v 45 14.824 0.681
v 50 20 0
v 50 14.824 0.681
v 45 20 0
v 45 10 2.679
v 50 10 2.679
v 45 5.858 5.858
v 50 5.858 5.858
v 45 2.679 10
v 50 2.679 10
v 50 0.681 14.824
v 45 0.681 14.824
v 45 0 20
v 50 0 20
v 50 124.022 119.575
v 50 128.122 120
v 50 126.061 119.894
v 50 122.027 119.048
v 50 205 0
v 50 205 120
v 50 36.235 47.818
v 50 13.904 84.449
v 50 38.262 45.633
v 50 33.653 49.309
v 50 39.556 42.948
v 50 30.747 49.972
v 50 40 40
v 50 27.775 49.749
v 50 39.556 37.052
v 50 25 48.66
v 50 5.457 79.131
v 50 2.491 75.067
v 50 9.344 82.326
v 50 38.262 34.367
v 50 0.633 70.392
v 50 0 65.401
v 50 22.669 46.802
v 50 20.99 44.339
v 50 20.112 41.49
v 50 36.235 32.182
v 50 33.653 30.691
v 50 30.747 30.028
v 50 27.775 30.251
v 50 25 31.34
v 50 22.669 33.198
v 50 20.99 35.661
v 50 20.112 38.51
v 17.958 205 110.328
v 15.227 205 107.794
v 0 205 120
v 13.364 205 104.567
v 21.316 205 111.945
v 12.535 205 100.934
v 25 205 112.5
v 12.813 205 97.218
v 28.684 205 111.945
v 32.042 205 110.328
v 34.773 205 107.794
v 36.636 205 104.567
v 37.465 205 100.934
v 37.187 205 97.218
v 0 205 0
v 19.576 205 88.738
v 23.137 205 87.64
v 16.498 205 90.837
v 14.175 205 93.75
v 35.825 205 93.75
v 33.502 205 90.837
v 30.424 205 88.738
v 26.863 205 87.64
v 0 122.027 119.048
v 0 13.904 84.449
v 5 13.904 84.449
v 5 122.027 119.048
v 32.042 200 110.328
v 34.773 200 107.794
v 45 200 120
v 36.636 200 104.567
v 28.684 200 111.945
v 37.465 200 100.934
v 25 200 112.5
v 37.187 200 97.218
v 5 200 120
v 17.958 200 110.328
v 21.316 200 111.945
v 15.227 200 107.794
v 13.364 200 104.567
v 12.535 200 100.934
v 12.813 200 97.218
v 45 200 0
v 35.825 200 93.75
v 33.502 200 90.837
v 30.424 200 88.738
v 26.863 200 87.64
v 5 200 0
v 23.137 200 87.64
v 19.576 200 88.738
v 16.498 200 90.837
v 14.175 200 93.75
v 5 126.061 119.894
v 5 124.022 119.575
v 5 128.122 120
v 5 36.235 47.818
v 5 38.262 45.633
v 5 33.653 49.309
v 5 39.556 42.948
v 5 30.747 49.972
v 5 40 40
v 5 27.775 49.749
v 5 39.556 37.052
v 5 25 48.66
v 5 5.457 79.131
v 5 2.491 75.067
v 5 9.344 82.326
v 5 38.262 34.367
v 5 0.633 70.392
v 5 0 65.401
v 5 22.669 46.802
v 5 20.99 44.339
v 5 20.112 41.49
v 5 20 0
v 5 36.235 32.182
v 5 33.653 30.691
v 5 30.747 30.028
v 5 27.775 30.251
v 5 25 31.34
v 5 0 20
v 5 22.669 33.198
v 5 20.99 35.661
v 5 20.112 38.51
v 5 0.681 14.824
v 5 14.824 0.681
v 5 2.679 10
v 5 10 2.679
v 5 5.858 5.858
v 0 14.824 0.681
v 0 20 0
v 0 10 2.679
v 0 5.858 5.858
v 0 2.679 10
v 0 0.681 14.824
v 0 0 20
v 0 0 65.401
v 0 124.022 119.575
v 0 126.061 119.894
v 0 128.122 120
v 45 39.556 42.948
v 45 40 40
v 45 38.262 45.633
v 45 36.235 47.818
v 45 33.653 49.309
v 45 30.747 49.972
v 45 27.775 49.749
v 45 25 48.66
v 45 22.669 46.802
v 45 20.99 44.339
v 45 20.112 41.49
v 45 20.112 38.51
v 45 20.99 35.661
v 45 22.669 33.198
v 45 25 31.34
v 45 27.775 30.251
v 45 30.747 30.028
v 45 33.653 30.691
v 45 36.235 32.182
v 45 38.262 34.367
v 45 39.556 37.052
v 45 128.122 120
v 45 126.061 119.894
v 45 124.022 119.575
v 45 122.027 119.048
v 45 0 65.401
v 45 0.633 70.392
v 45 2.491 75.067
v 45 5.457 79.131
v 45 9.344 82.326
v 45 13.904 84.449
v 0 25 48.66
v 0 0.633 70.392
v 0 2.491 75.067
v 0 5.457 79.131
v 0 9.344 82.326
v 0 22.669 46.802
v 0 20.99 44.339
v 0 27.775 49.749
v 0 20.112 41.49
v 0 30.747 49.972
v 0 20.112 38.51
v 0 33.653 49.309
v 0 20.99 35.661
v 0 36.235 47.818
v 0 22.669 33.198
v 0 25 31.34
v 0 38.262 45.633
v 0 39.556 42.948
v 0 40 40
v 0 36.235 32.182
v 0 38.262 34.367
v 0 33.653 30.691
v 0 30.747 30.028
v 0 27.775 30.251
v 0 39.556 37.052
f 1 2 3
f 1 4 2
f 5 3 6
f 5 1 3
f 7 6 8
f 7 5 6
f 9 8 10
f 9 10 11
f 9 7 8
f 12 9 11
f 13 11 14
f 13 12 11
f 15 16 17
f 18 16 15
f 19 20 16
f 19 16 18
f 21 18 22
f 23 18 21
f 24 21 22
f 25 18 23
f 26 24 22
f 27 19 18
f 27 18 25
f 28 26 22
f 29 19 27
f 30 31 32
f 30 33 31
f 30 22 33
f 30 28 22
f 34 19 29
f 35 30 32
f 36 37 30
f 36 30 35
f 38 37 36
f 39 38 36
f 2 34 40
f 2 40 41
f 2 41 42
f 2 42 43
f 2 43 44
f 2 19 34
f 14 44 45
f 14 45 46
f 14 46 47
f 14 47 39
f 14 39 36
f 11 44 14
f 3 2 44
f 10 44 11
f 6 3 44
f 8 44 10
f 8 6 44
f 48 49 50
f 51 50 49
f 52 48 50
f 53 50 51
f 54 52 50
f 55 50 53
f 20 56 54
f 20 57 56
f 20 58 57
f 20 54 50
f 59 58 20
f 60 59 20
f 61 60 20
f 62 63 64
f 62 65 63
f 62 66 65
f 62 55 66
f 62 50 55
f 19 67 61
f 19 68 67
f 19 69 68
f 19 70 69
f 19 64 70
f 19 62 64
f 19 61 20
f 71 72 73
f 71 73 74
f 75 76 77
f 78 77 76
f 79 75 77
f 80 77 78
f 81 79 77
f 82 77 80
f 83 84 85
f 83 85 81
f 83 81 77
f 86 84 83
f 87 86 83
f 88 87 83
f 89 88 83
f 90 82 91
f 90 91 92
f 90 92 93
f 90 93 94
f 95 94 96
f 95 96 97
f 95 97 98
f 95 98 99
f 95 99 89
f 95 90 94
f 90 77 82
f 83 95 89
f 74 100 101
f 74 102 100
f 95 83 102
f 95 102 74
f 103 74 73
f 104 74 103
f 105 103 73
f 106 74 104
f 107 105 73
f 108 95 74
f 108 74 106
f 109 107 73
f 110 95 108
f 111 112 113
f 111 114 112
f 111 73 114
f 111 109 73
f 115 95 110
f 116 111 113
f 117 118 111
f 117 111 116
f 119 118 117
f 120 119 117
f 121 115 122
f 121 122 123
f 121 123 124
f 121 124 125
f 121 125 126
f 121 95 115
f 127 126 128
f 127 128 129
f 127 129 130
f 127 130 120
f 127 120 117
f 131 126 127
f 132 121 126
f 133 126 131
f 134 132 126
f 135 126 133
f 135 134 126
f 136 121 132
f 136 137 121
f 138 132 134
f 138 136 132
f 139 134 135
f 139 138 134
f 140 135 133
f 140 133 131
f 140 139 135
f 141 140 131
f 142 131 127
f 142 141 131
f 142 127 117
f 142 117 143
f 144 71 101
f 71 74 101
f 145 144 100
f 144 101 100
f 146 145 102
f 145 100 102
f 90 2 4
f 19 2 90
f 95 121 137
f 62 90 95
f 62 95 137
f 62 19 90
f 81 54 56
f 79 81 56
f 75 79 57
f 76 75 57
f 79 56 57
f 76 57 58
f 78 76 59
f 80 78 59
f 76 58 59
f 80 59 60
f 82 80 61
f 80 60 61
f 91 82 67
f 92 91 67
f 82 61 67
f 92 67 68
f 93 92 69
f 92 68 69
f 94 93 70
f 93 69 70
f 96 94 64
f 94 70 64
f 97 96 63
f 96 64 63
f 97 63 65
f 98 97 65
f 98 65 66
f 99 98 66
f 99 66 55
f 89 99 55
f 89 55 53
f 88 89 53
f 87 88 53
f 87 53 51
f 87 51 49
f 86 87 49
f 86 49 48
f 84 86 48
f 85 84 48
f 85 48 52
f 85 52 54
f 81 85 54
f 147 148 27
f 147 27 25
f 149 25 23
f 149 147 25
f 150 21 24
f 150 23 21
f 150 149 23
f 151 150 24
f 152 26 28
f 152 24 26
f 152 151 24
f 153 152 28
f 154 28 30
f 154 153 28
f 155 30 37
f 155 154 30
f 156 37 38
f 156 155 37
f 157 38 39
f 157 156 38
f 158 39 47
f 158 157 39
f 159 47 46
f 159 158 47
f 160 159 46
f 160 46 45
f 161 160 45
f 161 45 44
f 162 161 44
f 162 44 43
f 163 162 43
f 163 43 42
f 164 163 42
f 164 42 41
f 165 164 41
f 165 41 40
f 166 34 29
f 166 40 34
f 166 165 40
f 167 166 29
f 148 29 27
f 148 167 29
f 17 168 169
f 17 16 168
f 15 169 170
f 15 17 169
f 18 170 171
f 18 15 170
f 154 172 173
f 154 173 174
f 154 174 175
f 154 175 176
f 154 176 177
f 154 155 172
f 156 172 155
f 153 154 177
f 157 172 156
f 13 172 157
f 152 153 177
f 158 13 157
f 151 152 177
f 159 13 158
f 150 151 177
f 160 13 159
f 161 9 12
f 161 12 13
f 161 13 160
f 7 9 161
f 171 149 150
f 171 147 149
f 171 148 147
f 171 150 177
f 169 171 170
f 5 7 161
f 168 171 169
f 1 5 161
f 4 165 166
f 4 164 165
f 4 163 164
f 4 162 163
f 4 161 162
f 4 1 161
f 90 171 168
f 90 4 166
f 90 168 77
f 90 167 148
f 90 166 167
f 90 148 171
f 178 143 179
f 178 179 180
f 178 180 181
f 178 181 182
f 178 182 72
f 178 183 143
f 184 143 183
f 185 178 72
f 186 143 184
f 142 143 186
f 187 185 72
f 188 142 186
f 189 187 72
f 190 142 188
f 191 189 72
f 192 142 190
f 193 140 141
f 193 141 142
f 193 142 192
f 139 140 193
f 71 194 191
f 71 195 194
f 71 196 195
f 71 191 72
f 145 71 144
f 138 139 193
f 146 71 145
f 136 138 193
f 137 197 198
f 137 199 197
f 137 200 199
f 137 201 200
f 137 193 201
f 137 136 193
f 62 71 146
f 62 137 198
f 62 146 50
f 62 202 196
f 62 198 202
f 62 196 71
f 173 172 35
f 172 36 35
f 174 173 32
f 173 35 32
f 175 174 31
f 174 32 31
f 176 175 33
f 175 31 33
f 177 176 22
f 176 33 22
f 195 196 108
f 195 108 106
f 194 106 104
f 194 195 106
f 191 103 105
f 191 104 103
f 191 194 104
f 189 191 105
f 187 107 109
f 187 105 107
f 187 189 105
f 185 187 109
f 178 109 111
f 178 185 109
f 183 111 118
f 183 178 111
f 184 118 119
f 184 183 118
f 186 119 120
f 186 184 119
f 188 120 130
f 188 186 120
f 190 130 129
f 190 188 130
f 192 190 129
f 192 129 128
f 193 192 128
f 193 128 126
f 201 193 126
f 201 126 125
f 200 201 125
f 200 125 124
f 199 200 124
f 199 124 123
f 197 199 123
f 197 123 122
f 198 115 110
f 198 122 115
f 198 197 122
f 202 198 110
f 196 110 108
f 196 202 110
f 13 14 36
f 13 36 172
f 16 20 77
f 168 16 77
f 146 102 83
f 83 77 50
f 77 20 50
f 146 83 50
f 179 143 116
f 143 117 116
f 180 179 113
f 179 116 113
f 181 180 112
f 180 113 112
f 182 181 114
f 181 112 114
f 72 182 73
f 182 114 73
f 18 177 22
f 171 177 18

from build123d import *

# Parameters (mm, degrees)
BOSS_EXTRU_1_DEPTH           = 120
ENL_V_MAT_EXTRU_1_DEPTH      = 243.744721879
ENL_V_MAT_EXTRU_1_DEPTH_BACK = 243.744721879
ENL_V_MAT_EXTRU_2_DEPTH      = 243.744721879
ENL_V_MAT_EXTRU_2_DEPTH_BACK = 243.744721879
ESQUISSE3_R                  = 10
CONG_1_R                     = 20
ENL_V_MAT_EXTRU_3_REACH      = 244.745
ESQUISSE4_R                  = 12.5


with BuildPart() as part:
    # Esquisse1 → Boss.-Extru.1 (new body)
    with BuildSketch(Plane.XY):
        Polygon((0, 0), (0, 205), (50, 205), (50, 0), (45, 0), (45, 200), (5, 200), (5, 0), align=None)
    extrude(amount=BOSS_EXTRU_1_DEPTH)

    # Esquisse2 → Enlèv. mat.-Extru.1 (cut, two sides: drawn at the far end of the back side and taken through both)
    with BuildSketch(Plane(origin=(50, 0, 0), x_dir=(0, 0, -1), z_dir=(1, 0, 0)).offset(-ENL_V_MAT_EXTRU_1_DEPTH_BACK)):
        Polygon((-80, 0), (-120, 125), (-120, 0), align=None)
    extrude(amount=ENL_V_MAT_EXTRU_1_DEPTH + ENL_V_MAT_EXTRU_1_DEPTH_BACK, mode=Mode.SUBTRACT)

    # Esquisse3 → Enlèv. mat.-Extru.2 (cut, two sides: drawn at the far end of the back side and taken through both)
    with BuildSketch(Plane(origin=(50, 0, 0), x_dir=(0, 0, -1), z_dir=(1, 0, 0)).offset(-ENL_V_MAT_EXTRU_2_DEPTH_BACK)):
        with Locations(Location((-40, 30, 0), (0, 0, 90))):
            Circle(ESQUISSE3_R)
    extrude(amount=ENL_V_MAT_EXTRU_2_DEPTH + ENL_V_MAT_EXTRU_2_DEPTH_BACK, mode=Mode.SUBTRACT)

    # Congé1
    cong_1_edges = [part.edges().sort_by_distance(p)[0] for p in [
        (2.5, 125, 120),
        (47.5, 125, 120),
        (2.5, 0, 80),
        (47.5, 0, 80),
        (2.5, 0, 0),
        (47.5, 0, 0),
    ]]
    fillet(cong_1_edges, radius=CONG_1_R)

    # Esquisse4 → Enlèv. mat.-Extru.3 (cut, up to next)
    with BuildSketch(Plane(origin=(0, 205, 0), x_dir=(1, 0, 0), z_dir=(0, 1, 0)), mode=Mode.PRIVATE) as enl_v_mat_extru_3_sk1:
        with Locations(Location((25, -100, 0), (0, 0, 270))):
            Circle(ESQUISSE4_R)
    enl_v_mat_extru_3_tool1 = extrude(enl_v_mat_extru_3_sk1.sketch, amount=-ENL_V_MAT_EXTRU_3_REACH, mode=Mode.PRIVATE) & part.part
    add(enl_v_mat_extru_3_tool1.solids().sort_by_distance((25, 205, 100))[0], mode=Mode.SUBTRACT)


solid = part.part
